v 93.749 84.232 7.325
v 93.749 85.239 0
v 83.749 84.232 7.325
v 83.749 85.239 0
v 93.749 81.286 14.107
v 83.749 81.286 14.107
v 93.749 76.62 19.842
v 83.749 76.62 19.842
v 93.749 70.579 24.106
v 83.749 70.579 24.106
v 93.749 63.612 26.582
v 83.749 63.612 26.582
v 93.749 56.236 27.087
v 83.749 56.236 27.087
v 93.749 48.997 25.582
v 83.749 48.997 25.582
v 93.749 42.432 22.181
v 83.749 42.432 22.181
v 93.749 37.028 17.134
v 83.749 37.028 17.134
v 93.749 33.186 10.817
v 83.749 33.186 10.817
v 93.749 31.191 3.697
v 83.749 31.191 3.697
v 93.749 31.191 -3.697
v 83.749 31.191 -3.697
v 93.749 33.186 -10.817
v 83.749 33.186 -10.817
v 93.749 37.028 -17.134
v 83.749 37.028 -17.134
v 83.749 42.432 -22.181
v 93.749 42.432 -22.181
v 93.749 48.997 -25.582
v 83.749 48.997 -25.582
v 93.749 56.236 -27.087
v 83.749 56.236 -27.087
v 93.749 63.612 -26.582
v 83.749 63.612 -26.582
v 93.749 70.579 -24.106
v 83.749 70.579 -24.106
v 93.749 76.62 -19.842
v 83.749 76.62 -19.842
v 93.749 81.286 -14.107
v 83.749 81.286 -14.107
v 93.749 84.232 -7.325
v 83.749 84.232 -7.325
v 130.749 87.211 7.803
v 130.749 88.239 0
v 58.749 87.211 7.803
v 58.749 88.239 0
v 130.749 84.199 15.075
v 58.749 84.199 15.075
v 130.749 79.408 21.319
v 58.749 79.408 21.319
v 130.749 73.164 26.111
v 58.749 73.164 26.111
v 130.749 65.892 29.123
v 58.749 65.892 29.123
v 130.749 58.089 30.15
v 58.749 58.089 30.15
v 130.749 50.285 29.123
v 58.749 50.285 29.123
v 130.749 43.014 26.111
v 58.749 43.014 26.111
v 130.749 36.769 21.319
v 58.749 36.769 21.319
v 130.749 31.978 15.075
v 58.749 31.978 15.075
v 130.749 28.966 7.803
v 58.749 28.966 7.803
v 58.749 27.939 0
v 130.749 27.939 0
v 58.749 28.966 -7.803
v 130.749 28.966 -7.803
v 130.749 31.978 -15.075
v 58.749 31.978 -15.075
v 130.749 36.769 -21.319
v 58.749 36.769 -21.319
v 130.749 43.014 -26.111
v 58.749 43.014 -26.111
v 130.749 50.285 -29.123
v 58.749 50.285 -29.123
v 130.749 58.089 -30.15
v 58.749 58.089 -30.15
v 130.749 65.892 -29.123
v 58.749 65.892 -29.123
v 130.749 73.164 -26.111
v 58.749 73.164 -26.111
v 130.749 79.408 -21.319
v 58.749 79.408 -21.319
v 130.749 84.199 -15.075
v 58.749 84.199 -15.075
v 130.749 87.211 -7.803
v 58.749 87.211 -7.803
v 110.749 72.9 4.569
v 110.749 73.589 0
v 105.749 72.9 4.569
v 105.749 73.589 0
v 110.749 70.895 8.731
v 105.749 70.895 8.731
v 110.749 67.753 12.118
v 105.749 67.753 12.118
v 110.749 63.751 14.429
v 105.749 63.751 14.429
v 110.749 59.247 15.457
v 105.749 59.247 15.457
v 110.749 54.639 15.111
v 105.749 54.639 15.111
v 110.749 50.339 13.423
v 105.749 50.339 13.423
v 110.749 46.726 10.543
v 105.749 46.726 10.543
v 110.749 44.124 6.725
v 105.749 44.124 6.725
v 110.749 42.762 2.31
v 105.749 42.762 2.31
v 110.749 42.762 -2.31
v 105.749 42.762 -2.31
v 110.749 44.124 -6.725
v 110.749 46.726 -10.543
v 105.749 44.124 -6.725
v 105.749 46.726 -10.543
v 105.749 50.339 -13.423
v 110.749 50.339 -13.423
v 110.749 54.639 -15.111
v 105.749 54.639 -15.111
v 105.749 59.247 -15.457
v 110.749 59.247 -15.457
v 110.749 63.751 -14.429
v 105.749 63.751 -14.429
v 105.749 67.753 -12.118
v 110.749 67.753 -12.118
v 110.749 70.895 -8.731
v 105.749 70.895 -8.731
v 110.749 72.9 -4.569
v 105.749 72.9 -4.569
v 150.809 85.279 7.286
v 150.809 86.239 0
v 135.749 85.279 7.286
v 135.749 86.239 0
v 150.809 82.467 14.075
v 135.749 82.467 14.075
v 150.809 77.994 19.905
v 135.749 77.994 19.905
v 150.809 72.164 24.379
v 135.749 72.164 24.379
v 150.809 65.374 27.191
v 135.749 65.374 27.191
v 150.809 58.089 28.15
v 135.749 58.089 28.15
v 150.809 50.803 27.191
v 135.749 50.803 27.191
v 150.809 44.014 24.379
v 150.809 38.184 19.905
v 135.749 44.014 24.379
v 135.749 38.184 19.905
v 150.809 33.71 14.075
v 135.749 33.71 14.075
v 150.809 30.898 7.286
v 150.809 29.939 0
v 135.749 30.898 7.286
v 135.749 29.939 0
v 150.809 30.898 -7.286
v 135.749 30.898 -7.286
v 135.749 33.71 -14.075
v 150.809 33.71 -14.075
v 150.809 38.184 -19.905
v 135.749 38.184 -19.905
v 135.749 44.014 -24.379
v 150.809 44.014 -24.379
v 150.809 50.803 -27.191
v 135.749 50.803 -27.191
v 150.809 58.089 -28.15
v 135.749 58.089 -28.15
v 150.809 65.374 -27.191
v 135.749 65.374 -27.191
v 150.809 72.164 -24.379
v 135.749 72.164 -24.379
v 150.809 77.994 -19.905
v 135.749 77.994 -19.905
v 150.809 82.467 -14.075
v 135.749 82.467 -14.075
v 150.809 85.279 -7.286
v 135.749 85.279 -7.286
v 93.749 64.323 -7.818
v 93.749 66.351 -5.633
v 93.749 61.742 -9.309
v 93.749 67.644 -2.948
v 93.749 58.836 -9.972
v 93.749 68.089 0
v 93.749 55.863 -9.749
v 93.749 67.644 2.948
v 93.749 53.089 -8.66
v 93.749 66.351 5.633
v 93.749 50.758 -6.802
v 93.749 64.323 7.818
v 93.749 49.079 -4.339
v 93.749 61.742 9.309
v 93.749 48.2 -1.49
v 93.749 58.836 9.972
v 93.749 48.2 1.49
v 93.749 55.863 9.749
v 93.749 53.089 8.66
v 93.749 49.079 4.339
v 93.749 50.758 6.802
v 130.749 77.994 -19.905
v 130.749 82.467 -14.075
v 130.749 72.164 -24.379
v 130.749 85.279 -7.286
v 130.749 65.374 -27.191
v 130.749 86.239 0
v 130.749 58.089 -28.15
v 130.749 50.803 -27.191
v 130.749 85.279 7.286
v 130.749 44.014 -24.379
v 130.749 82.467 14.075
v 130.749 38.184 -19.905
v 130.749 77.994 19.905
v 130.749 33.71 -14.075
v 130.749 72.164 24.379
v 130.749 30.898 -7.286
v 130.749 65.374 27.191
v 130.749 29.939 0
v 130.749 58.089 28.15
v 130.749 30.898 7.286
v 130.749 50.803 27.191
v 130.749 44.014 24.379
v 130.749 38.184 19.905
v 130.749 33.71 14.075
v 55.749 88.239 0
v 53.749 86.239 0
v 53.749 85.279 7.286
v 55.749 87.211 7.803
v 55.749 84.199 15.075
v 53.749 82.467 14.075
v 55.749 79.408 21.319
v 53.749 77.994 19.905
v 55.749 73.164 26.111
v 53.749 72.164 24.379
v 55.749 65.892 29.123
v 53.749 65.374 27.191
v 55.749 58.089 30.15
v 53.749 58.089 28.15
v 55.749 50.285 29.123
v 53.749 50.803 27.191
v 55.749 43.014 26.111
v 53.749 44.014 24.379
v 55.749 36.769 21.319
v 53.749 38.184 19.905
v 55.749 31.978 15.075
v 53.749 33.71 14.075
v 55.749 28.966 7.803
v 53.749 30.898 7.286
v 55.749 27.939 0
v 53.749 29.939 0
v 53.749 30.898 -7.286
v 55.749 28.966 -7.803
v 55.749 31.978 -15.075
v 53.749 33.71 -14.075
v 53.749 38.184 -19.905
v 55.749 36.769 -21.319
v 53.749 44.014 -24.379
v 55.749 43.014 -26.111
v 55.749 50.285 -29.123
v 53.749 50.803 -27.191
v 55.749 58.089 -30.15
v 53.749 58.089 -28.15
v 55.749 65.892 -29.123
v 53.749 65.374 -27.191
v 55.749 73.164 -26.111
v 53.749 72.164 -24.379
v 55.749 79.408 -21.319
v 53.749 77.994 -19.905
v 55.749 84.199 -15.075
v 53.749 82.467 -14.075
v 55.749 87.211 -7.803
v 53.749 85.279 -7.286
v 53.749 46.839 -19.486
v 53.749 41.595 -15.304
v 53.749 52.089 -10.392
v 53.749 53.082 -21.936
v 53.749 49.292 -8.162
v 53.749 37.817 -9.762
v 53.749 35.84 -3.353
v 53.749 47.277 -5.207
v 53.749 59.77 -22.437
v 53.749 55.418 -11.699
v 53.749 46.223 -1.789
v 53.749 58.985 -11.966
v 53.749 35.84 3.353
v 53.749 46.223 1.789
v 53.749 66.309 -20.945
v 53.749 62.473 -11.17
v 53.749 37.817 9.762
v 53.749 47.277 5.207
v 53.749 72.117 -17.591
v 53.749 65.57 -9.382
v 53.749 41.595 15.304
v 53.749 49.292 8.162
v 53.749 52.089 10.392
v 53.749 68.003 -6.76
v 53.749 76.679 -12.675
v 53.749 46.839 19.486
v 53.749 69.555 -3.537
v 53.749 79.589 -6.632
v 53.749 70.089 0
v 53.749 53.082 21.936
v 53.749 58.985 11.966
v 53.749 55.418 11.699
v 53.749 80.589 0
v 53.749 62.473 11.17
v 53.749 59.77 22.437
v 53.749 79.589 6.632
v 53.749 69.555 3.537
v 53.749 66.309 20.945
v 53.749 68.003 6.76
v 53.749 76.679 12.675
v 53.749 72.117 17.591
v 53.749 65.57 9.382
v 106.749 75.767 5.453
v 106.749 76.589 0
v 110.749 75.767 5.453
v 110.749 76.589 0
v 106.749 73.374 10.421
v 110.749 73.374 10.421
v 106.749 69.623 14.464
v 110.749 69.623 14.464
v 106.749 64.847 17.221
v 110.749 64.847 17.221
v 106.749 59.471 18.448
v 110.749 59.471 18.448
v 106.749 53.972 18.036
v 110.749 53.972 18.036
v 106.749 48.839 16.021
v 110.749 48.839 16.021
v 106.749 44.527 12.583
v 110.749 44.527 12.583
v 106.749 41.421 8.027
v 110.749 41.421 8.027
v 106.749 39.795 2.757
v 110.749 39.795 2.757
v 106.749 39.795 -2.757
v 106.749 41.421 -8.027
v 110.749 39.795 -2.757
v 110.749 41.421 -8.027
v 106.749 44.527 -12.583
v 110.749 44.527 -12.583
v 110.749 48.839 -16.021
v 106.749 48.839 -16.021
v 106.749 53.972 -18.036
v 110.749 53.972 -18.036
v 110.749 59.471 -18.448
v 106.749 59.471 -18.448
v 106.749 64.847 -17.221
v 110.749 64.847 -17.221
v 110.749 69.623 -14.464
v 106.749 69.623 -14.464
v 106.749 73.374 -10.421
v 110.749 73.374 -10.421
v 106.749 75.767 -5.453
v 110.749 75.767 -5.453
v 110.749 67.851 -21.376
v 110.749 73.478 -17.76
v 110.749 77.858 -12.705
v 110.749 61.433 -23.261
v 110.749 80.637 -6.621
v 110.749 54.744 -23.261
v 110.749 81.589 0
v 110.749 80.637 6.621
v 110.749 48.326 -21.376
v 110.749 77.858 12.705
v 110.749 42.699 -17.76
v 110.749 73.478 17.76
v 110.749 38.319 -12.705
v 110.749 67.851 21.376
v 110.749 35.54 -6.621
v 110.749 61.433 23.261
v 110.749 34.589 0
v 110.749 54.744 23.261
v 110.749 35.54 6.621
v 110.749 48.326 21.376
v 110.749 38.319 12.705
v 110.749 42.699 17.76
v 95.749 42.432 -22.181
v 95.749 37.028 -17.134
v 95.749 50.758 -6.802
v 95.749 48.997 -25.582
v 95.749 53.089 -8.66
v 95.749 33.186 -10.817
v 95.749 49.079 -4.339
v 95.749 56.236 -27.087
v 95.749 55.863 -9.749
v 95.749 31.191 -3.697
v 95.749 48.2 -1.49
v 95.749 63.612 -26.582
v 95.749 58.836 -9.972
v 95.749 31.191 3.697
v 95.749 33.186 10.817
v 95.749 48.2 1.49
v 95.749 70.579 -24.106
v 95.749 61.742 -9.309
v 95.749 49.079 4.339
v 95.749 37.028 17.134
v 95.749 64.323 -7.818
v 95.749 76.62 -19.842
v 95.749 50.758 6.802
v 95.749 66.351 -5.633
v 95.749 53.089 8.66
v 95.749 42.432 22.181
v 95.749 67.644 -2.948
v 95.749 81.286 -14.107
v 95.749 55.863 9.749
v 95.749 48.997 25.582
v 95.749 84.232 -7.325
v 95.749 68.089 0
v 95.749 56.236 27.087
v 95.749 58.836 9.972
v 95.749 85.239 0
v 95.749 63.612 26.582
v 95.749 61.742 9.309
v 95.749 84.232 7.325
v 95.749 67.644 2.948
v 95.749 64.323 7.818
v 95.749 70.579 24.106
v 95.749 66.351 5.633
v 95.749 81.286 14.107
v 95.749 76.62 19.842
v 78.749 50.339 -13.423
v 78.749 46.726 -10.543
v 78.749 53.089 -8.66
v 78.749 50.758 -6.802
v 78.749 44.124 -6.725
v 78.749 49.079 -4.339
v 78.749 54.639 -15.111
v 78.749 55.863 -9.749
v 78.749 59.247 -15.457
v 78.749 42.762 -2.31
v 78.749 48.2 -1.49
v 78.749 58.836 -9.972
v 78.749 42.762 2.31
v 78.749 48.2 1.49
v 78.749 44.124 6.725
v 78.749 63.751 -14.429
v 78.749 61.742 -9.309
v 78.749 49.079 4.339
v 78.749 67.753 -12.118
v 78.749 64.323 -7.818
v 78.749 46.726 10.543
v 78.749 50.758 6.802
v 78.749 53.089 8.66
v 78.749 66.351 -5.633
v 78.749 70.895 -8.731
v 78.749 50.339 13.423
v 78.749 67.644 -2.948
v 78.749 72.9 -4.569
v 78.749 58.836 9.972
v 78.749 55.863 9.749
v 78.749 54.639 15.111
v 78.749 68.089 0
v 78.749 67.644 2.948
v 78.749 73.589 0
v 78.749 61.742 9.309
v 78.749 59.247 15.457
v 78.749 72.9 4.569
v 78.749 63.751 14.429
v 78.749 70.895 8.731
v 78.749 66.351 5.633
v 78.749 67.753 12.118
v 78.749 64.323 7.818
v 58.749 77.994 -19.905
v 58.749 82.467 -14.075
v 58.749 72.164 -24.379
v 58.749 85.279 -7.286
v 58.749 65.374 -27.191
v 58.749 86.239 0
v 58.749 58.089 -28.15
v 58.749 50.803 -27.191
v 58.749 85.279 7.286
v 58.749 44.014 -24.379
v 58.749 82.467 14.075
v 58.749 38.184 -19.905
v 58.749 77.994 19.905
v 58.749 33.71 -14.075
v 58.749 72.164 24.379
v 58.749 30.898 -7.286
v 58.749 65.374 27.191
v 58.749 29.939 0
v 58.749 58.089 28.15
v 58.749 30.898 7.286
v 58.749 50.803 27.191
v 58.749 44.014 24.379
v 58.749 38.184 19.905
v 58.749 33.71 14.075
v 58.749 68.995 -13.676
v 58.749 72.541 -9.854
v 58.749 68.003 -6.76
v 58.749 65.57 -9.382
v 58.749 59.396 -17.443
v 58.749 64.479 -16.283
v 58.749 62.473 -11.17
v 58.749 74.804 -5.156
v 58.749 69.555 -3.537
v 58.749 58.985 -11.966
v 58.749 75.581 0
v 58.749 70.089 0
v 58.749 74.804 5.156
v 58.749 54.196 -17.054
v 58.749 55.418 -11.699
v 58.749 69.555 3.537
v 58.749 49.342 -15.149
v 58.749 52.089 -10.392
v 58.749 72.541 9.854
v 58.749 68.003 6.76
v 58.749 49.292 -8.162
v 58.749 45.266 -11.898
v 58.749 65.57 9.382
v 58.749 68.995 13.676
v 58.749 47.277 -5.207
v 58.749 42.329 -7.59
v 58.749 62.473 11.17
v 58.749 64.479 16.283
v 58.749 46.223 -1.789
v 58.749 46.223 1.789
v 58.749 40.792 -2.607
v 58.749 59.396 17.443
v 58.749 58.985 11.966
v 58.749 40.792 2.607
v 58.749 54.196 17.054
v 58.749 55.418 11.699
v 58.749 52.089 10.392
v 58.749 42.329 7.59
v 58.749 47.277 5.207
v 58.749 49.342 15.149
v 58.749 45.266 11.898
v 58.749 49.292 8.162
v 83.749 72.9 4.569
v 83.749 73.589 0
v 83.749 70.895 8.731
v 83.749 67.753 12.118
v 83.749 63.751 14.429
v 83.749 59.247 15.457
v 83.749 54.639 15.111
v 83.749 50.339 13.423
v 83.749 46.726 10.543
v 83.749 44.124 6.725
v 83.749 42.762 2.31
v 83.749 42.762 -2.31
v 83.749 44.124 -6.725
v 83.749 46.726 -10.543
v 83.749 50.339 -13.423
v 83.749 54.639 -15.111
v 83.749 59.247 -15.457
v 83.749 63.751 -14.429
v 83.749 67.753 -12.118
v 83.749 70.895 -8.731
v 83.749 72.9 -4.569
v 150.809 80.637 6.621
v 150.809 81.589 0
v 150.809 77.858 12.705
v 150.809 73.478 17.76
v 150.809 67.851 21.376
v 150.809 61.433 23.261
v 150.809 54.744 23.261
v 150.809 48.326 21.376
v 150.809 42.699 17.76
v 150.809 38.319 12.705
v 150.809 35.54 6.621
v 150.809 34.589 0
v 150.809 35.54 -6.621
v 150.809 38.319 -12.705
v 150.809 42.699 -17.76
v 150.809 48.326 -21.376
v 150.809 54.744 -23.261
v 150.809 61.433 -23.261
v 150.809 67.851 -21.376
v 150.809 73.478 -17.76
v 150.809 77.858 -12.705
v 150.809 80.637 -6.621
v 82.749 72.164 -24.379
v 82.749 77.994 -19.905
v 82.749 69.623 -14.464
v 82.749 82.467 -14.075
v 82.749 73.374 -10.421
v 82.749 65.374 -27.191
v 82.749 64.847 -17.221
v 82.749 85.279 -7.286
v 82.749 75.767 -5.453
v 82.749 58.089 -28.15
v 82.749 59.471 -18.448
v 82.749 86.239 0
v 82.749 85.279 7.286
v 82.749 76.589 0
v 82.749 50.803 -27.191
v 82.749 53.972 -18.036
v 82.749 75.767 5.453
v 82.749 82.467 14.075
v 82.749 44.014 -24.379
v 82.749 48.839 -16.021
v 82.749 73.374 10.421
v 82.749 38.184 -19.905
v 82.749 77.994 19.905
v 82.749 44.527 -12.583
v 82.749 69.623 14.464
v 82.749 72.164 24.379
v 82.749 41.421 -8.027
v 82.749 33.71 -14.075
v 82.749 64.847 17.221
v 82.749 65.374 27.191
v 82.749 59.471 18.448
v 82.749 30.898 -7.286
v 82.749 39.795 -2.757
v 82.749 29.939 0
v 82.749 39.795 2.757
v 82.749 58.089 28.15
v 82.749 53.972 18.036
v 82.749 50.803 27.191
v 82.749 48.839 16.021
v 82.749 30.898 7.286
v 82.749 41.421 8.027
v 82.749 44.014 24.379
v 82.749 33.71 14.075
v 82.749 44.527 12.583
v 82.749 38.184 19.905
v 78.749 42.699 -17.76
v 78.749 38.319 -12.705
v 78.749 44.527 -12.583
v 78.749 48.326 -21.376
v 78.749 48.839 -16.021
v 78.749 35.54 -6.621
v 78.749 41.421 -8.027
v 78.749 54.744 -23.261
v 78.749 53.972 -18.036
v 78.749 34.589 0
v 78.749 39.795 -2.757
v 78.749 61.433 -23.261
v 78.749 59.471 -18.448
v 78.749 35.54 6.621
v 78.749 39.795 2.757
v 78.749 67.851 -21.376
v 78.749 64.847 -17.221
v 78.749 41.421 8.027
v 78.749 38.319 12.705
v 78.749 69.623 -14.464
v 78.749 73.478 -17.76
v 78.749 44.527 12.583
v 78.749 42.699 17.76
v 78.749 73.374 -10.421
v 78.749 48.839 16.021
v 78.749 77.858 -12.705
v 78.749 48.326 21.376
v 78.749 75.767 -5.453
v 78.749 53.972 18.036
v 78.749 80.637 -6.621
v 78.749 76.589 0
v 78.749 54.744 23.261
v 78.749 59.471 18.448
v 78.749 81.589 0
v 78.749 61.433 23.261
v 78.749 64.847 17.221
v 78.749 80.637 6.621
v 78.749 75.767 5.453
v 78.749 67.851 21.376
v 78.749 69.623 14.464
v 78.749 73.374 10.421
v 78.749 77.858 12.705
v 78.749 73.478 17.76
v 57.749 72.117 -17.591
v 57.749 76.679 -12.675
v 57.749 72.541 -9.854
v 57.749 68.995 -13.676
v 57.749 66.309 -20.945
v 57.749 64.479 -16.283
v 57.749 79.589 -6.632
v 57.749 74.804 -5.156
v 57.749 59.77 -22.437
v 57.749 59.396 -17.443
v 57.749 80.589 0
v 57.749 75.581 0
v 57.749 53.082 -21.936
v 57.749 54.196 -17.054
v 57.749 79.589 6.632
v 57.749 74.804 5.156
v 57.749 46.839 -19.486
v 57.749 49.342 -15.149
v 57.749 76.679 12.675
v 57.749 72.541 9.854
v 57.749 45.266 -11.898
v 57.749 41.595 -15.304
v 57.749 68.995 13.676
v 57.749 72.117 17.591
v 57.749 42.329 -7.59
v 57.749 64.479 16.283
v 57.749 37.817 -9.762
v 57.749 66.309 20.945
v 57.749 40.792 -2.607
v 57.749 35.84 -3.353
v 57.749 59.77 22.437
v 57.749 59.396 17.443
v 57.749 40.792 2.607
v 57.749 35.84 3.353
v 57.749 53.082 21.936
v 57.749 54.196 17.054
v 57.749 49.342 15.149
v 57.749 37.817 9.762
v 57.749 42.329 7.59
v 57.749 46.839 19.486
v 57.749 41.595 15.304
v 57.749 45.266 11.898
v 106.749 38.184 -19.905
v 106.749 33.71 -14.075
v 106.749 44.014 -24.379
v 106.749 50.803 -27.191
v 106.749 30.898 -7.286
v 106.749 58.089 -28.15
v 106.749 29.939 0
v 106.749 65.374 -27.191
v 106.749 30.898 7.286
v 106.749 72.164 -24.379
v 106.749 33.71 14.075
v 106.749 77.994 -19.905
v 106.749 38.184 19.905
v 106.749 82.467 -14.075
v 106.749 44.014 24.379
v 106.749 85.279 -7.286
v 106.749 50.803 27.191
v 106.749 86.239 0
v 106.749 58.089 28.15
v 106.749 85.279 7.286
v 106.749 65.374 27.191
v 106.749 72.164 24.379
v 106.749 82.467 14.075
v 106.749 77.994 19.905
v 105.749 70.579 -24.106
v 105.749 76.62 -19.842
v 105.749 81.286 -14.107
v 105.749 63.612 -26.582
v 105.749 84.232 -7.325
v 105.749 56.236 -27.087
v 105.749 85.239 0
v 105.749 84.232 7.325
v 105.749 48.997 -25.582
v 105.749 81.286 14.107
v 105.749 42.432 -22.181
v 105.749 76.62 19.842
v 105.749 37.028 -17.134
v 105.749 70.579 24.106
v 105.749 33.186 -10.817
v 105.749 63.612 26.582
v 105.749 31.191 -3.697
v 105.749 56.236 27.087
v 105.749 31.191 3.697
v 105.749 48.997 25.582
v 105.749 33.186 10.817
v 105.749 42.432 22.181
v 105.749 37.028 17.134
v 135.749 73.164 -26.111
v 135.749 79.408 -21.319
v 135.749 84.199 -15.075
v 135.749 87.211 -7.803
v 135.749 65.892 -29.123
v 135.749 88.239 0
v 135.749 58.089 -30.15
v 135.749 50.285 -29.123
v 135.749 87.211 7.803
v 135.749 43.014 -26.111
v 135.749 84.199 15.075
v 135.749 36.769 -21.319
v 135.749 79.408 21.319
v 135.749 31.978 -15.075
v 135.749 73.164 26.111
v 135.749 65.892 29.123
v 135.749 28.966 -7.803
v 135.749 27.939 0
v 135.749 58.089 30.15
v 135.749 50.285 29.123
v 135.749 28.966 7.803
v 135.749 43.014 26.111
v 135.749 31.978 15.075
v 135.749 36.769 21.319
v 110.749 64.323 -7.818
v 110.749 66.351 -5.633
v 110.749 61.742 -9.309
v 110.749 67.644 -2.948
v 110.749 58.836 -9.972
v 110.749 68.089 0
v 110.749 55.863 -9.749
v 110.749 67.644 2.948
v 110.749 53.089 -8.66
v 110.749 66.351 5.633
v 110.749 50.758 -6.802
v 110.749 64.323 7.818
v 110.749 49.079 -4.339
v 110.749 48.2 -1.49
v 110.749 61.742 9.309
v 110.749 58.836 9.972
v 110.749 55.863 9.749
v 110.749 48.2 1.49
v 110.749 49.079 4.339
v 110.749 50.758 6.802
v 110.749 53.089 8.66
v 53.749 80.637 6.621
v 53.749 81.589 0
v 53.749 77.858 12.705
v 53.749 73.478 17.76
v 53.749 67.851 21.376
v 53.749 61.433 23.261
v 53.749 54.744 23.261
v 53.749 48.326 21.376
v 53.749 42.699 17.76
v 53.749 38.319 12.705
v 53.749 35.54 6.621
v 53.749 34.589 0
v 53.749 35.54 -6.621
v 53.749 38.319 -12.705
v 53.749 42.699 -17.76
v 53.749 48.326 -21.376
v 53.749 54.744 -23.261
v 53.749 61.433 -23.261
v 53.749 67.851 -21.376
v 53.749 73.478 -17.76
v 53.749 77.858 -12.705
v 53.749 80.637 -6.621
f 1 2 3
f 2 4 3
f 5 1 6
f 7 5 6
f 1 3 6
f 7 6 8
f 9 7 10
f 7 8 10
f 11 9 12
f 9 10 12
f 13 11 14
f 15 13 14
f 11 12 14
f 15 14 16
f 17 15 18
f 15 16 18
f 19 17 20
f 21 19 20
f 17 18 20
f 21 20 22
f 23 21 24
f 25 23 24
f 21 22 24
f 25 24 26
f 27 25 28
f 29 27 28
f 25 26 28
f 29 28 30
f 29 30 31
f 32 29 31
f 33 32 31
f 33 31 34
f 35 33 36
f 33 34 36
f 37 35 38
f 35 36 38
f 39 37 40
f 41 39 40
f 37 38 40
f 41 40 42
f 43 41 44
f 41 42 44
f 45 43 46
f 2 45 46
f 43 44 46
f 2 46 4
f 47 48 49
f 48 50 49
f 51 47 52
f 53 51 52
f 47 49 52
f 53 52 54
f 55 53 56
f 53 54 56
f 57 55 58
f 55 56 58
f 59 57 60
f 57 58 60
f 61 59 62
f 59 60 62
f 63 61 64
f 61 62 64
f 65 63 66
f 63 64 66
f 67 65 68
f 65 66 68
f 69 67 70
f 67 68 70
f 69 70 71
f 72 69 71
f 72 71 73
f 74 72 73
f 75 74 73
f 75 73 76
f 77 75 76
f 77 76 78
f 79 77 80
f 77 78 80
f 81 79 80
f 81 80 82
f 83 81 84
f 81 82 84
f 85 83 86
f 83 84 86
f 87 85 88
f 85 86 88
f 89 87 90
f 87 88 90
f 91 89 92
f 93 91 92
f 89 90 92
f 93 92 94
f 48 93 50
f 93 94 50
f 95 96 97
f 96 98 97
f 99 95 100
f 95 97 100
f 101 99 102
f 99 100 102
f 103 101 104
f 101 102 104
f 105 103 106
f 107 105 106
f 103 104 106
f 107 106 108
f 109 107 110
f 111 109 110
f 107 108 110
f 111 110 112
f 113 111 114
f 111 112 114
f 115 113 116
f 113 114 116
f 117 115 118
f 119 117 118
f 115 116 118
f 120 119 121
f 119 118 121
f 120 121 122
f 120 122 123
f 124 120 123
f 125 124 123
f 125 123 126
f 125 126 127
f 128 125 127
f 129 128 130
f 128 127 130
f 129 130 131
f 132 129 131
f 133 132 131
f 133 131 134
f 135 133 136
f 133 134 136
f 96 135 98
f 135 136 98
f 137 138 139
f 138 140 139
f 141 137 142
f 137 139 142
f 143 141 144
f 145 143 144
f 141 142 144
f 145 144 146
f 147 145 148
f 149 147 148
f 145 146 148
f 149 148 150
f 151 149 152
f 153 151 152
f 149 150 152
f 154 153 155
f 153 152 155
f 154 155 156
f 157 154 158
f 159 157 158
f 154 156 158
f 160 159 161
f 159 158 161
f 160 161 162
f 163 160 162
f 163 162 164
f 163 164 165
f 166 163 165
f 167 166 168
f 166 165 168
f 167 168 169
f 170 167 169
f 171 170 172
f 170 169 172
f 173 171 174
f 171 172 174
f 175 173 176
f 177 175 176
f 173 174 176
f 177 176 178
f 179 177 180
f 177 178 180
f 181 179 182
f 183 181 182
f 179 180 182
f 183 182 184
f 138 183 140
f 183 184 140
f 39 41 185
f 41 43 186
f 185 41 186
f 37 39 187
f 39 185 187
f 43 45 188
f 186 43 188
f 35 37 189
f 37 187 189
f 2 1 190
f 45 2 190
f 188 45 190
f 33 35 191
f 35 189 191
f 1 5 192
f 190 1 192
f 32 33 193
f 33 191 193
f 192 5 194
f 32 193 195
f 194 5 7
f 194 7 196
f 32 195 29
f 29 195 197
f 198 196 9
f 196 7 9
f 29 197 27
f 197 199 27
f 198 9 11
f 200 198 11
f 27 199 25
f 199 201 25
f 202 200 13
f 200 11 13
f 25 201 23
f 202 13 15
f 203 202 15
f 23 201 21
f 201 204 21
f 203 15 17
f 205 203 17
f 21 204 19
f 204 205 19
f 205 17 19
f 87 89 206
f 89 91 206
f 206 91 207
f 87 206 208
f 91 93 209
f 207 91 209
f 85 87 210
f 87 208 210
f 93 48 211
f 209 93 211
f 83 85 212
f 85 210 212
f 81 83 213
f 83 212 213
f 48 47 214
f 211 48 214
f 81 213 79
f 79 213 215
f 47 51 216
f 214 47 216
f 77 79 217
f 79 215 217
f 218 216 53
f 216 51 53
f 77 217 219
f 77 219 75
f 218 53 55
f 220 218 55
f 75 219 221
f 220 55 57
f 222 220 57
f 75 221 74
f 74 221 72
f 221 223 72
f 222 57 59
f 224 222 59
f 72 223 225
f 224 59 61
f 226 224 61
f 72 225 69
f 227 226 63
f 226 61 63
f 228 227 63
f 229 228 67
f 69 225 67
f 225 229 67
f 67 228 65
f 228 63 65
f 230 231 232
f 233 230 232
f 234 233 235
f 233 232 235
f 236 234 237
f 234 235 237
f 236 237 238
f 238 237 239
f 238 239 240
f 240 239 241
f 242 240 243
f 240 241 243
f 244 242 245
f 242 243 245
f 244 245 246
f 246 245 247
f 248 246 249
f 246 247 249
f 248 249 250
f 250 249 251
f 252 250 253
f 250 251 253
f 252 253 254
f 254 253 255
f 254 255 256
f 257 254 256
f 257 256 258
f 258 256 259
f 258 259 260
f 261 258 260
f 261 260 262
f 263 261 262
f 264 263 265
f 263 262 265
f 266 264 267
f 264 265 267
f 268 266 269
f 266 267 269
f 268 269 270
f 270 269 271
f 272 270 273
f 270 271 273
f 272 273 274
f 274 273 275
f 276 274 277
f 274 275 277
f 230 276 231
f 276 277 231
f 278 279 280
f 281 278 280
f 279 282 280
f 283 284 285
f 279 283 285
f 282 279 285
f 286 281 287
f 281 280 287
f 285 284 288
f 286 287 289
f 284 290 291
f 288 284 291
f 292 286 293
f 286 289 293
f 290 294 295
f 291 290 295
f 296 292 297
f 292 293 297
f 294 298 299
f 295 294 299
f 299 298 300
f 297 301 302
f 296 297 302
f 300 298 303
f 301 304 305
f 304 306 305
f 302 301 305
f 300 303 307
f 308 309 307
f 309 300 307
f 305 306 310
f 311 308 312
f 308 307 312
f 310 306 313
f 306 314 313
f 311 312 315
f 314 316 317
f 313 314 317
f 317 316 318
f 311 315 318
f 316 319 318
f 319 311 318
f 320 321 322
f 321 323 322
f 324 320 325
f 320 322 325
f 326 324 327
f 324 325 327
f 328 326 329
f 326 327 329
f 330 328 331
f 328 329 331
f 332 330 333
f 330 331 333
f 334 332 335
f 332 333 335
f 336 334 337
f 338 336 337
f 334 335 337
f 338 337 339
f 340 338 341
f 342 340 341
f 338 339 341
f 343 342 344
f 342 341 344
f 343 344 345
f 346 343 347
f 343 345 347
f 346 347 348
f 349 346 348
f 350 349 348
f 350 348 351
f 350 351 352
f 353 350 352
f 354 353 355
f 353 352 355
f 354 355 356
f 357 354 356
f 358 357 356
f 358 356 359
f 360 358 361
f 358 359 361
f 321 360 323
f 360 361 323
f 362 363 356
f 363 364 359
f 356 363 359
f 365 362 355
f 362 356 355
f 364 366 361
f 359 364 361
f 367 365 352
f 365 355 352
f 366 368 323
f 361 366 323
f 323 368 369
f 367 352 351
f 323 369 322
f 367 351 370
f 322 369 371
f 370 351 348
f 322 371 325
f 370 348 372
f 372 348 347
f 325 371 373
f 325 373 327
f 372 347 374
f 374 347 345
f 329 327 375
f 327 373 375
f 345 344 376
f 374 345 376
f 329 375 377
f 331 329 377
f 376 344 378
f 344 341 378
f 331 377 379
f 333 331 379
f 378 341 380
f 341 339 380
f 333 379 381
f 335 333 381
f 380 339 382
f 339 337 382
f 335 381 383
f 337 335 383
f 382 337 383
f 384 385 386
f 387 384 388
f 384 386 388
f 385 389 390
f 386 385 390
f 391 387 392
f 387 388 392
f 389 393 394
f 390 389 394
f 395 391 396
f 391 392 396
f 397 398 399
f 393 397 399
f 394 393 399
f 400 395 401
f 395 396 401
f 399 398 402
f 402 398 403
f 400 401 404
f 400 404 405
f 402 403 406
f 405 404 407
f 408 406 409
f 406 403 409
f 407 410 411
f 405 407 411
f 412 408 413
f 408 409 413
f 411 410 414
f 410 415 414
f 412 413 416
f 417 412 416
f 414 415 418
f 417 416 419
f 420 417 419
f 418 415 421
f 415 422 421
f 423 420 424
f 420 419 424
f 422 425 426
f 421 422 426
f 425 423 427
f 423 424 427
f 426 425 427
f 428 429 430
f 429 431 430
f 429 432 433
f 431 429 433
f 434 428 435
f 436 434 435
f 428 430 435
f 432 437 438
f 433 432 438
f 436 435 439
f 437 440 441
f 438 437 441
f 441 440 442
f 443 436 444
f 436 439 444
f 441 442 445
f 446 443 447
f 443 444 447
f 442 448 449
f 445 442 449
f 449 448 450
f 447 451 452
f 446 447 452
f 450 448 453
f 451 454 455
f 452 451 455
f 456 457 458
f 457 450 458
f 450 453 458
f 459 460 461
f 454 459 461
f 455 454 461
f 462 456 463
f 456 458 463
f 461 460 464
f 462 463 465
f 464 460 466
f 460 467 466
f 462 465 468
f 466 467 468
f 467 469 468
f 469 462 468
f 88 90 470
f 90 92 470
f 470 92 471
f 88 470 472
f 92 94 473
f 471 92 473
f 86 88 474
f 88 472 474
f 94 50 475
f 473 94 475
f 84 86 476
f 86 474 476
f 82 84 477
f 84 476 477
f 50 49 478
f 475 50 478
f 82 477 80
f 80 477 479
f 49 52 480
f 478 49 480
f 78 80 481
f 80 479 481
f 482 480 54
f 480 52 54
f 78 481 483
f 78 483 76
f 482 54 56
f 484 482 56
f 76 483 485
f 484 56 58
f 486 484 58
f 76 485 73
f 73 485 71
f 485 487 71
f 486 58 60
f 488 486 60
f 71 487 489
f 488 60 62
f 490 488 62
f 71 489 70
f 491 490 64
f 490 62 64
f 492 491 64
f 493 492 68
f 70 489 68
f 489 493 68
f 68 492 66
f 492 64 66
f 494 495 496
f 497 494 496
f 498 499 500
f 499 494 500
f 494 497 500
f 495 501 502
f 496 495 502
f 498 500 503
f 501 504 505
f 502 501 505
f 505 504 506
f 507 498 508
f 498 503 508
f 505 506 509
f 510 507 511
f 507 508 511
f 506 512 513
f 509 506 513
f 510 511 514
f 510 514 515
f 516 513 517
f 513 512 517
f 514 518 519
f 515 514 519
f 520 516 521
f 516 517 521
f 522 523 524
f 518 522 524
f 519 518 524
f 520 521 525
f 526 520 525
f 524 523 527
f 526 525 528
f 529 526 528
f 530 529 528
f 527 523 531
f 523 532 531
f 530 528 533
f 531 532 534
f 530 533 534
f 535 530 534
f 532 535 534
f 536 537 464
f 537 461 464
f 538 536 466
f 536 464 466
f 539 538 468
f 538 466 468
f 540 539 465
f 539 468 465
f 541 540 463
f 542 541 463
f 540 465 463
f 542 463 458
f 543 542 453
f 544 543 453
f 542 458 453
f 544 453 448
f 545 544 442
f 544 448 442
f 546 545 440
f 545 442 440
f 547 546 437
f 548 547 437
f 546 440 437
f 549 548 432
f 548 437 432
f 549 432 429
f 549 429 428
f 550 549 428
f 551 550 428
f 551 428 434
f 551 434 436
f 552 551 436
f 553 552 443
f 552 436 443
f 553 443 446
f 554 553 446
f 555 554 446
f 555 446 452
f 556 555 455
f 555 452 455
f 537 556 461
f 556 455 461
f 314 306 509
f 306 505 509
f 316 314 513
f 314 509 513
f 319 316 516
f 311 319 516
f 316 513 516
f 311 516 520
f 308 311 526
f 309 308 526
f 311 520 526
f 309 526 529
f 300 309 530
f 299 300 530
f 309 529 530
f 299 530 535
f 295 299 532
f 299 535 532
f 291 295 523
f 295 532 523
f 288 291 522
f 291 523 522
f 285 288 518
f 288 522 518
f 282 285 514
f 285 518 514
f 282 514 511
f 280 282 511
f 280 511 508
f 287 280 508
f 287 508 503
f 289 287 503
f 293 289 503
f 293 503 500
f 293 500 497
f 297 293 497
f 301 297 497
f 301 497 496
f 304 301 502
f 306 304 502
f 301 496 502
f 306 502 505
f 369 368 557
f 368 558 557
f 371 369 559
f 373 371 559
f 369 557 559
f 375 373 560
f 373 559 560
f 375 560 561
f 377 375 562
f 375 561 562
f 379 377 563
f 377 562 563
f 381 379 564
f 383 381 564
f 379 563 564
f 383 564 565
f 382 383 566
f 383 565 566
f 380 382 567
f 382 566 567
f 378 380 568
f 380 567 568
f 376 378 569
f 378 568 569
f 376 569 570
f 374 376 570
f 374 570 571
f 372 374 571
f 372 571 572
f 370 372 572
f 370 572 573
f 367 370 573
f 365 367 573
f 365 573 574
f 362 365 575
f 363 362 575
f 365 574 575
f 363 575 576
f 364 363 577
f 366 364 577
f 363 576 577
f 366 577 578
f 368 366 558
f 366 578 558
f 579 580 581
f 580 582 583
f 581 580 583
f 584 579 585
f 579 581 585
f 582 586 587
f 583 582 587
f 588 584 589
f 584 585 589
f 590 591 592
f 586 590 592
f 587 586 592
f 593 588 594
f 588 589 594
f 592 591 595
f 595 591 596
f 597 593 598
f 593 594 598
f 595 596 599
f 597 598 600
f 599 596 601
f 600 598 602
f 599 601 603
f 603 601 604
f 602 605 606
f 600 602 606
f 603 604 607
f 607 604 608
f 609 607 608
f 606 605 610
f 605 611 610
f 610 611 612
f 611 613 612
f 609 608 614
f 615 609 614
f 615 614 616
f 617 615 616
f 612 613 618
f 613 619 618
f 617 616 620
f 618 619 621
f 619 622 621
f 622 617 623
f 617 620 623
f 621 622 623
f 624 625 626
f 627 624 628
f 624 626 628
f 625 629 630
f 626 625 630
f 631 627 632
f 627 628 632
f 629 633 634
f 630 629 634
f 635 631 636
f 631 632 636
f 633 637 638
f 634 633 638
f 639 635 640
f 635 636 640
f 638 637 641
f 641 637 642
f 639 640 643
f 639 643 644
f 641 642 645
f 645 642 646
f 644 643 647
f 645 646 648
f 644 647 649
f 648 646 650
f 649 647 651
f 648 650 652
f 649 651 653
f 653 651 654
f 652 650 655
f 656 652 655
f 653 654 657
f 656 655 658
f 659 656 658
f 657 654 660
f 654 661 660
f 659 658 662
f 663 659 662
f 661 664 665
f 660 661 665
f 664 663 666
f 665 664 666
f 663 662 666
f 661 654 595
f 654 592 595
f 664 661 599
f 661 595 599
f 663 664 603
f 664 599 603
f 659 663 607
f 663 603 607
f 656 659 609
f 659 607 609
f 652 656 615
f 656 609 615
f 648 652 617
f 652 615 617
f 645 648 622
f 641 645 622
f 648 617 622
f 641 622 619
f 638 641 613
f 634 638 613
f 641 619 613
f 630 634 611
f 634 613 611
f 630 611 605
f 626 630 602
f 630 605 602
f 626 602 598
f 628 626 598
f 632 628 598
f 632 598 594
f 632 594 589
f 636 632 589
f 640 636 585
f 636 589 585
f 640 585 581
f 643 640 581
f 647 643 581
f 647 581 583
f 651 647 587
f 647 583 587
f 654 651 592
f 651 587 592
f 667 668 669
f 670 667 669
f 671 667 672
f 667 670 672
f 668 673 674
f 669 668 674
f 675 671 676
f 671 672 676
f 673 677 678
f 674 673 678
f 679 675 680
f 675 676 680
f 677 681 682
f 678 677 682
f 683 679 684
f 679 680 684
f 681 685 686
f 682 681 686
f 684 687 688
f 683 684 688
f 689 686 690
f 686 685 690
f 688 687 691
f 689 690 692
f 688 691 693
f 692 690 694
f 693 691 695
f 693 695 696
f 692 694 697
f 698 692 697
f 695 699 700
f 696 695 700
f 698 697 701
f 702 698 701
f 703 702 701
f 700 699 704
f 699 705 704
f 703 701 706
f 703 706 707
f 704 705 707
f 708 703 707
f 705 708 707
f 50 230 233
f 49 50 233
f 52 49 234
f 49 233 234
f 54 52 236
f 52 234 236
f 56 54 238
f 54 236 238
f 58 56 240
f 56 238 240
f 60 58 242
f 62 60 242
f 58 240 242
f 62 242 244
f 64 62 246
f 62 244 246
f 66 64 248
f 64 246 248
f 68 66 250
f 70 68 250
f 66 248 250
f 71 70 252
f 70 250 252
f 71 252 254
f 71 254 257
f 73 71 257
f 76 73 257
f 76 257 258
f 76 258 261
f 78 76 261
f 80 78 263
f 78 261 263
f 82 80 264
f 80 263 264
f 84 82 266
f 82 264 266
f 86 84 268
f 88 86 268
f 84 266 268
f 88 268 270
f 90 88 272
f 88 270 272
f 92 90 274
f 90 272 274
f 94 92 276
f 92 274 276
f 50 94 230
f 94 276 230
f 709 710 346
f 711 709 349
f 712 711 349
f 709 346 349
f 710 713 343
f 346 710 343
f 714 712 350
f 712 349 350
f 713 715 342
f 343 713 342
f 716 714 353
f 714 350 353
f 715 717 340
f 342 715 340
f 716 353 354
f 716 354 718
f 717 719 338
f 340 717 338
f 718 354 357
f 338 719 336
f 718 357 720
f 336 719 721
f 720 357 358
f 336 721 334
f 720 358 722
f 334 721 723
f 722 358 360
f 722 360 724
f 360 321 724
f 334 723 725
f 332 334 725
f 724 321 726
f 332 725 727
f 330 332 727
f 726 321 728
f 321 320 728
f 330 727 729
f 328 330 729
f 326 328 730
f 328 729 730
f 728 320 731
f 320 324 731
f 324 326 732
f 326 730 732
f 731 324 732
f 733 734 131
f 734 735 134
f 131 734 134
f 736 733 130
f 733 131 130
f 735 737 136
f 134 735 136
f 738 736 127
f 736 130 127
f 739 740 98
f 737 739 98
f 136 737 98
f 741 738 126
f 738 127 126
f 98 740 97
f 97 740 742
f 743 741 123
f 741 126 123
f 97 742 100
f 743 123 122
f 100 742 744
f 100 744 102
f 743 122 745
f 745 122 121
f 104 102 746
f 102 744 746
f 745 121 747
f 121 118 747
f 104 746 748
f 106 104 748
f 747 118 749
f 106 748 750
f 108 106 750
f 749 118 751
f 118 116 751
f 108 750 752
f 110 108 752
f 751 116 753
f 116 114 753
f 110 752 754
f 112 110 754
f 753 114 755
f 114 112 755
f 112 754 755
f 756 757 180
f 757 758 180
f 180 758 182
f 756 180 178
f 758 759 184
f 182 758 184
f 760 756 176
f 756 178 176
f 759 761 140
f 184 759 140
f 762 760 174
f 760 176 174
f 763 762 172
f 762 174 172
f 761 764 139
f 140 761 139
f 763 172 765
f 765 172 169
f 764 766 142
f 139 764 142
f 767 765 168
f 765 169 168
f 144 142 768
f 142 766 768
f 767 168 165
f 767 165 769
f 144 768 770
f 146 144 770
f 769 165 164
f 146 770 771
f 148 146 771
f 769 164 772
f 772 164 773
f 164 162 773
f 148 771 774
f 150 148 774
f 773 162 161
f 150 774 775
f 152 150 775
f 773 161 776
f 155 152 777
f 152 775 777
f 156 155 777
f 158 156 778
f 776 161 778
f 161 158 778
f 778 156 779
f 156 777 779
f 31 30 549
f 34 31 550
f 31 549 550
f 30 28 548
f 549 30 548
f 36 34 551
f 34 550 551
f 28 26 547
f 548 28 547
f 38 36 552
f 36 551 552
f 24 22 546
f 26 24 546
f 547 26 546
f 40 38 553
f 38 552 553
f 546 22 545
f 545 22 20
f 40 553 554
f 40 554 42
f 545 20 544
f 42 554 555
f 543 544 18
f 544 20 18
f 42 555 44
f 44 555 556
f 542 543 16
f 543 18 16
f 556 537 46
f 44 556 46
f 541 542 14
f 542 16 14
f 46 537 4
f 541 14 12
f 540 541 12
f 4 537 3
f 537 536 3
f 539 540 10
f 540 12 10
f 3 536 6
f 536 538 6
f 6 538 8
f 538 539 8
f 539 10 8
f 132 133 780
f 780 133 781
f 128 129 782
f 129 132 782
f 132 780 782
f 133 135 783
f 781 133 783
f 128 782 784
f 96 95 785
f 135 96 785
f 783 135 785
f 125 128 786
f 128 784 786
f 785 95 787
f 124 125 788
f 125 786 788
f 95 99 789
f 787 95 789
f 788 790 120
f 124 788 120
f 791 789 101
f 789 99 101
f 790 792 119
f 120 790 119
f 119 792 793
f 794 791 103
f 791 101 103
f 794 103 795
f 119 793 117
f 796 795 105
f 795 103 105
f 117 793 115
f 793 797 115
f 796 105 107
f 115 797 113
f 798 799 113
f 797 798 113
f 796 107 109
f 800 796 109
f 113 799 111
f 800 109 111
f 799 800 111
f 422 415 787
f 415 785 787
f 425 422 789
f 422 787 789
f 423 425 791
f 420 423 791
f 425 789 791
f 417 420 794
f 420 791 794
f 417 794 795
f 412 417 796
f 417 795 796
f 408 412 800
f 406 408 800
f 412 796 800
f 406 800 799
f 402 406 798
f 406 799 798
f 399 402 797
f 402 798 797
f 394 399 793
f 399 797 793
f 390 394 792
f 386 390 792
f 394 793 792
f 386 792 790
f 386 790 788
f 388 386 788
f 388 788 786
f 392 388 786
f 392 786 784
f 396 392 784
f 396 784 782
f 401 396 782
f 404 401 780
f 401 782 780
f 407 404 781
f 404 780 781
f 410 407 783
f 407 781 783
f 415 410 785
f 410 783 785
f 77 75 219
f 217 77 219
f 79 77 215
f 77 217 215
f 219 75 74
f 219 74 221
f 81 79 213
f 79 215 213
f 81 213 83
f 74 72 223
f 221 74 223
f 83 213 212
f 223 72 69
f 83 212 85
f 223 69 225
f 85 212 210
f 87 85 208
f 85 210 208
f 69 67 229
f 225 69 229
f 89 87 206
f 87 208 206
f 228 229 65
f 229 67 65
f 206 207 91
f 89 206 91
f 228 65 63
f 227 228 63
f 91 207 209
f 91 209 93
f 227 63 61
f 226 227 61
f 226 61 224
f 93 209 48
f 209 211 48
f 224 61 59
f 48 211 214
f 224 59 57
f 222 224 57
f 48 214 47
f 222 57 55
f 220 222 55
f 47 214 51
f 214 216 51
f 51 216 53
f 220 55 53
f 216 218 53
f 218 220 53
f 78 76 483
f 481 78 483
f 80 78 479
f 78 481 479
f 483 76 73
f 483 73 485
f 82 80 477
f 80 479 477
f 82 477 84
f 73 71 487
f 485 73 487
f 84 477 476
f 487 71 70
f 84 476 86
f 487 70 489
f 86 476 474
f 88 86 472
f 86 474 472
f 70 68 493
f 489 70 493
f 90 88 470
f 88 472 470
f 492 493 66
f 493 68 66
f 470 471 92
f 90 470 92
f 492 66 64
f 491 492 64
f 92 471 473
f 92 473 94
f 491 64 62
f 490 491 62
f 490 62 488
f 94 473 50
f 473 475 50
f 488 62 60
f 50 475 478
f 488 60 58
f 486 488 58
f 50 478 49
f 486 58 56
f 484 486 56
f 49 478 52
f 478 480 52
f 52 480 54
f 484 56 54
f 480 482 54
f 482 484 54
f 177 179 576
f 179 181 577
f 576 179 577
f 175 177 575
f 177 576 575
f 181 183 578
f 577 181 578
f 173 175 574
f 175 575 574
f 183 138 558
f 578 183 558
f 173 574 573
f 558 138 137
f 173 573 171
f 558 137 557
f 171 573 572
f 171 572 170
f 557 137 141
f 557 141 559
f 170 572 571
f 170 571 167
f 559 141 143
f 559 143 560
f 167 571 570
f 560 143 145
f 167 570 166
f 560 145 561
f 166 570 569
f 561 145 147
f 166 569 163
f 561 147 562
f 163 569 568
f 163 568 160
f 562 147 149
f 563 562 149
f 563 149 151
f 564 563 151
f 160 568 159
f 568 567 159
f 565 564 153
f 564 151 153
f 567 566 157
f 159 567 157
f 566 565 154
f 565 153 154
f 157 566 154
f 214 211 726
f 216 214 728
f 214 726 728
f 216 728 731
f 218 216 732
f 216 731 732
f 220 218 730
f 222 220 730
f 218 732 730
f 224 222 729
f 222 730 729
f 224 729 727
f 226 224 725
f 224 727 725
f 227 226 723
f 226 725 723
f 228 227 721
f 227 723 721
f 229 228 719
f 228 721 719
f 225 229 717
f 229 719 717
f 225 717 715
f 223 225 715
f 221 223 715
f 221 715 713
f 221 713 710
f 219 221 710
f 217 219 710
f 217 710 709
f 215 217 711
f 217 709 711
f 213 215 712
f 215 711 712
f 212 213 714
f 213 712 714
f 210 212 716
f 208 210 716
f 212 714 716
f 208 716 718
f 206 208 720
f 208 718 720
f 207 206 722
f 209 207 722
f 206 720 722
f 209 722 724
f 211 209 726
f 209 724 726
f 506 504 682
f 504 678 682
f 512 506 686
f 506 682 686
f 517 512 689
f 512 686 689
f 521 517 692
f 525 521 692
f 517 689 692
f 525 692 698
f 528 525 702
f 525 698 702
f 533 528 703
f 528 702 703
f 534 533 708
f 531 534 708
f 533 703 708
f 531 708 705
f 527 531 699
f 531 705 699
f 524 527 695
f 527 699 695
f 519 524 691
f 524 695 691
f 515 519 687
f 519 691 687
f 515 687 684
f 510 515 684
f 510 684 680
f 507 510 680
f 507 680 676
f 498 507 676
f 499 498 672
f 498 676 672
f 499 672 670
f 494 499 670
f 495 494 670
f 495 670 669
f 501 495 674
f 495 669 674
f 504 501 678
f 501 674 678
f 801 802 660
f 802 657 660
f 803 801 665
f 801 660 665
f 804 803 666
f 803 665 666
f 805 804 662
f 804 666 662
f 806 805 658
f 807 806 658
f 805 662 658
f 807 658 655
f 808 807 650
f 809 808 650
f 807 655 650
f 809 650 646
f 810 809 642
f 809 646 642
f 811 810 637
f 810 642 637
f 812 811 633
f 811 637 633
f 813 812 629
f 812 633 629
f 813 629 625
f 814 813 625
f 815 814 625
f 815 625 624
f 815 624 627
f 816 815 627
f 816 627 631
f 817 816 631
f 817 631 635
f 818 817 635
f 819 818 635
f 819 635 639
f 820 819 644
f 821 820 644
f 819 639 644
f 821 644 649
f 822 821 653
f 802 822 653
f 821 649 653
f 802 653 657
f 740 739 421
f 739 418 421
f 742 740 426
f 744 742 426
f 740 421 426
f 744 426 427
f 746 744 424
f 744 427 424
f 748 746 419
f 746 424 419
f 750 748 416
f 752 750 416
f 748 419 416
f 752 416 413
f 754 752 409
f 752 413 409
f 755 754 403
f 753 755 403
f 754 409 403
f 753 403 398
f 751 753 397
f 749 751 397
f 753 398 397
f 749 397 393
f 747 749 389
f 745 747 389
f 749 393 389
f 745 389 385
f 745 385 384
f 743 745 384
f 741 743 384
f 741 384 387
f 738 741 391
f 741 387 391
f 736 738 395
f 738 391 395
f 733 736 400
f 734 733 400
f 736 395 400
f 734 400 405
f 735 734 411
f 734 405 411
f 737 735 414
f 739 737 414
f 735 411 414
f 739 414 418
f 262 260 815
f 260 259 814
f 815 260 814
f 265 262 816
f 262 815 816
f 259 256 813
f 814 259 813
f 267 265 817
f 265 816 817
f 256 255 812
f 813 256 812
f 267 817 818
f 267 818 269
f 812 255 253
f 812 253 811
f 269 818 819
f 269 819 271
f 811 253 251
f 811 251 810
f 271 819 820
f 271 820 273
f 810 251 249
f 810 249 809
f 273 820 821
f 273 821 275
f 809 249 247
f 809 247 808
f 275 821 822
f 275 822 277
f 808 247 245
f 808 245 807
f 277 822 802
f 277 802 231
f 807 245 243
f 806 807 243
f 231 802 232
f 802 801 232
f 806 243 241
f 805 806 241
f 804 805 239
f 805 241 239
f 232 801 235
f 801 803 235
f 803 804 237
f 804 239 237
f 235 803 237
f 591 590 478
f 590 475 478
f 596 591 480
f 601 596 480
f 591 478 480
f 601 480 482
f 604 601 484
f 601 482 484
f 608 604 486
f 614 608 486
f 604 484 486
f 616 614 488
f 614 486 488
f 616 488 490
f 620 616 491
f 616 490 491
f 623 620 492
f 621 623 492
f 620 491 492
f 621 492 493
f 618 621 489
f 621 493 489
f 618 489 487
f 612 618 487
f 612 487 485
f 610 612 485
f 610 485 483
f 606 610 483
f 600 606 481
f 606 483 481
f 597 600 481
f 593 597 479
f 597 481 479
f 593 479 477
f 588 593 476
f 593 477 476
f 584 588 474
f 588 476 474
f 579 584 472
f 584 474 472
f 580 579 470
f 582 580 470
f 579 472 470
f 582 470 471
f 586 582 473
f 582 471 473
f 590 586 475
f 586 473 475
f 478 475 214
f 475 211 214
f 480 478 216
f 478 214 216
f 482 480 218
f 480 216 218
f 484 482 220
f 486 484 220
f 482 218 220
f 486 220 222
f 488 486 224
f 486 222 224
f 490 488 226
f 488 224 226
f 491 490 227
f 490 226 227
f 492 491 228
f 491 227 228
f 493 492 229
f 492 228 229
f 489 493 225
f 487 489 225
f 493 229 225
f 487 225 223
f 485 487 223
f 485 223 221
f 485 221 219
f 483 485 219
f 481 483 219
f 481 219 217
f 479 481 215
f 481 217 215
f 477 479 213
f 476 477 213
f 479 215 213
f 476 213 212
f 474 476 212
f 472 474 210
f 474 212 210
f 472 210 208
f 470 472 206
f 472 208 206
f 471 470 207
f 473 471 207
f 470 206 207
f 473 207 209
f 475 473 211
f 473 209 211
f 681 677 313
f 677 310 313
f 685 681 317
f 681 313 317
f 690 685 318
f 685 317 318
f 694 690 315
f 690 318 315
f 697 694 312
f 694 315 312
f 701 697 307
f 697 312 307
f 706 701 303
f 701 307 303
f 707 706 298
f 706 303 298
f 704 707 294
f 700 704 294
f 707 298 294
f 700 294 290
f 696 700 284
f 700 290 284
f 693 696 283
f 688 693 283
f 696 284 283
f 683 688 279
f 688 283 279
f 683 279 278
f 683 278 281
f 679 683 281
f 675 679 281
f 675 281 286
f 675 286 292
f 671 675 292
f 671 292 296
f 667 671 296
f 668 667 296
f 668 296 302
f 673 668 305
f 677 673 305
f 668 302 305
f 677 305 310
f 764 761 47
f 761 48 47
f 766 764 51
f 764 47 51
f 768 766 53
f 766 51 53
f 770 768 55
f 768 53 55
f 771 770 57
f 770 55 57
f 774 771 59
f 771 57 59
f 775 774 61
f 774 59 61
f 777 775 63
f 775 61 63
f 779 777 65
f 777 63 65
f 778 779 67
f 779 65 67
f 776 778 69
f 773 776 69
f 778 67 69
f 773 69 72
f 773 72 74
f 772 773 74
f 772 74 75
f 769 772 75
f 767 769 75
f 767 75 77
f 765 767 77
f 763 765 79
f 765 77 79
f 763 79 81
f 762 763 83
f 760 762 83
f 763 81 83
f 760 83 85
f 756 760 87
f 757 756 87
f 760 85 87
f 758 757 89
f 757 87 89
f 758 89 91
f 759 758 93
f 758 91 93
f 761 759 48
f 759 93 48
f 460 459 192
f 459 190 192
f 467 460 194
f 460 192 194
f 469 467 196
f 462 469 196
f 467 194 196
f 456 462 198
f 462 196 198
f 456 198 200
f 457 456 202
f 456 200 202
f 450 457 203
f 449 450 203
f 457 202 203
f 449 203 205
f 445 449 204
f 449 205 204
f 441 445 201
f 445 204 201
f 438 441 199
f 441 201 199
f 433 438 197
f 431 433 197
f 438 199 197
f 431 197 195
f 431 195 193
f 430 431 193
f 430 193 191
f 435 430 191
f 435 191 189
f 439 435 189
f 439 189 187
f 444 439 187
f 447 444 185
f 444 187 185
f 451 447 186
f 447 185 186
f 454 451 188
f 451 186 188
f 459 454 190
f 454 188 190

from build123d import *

# Parameters (mm, degrees)
F3_SIZE = 2


with BuildPart() as f1:
    # F0 (on Top) → F1 (revolve)
    with BuildSketch(Plane.XY):
        Polygon((95.7488511355, 85.2385589326), (95.7488511355, 68.0885589326), (110.7488511355, 68.0885589326), (110.7488511355, 73.5885589326), (105.7488511355, 73.5885589326), (105.7488511355, 85.2385589326), align=None)
    revolve(axis=Axis((39.9243277874, 58.0885589326, 0), (1, 0, 0)))


with BuildPart() as f1b:
    # F0 (on Top) → F1, piece 2 (revolve)
    with BuildSketch(Plane.XY):
        Polygon((135.7488511355, 88.2385589326), (130.7488511355, 88.2385589326), (130.7488511355, 86.2385589326), (106.7488511355, 86.2385589326), (106.7488511355, 76.5885589326), (110.7488511355, 76.5885589326), (110.7488511355, 81.5885589326), (135.7488511355, 81.5885589326), (150.8092582226, 81.5885589326), (150.8092582226, 86.2385589326), (135.7488511355, 86.2385589326), align=None)
    revolve(axis=Axis((39.9243277874, 58.0885589326, 0), (1, 0, 0)))


with BuildPart() as f1c:
    # F0 (on Top) → F1, piece 3 (revolve)
    with BuildSketch(Plane.XY):
        Polygon((58.7488511355, 88.2385589326), (53.7488511355, 88.2385589326), (53.7488511355, 81.5885589326), (78.7488511355, 81.5885589326), (78.7488511355, 76.5885589326), (82.7488511355, 76.5885589326), (82.7488511355, 86.2385589326), (58.7488511355, 86.2385589326), align=None)
    revolve(axis=Axis((39.9243277874, 58.0885589326, 0), (1, 0, 0)))

    # F3
    f3_edges = [f1c.edges().sort_by_distance(p)[0] for p in [
        (53.748851, 27.938559, 0),
    ]]
    chamfer(f3_edges, length=F3_SIZE)


with BuildPart() as f1d:
    # F0 (on Top) → F1, piece 4 (revolve)
    with BuildSketch(Plane.XY):
        Polygon((78.7488511355, 73.5885589326), (78.7488511355, 68.0885589326), (93.7488511355, 68.0885589326), (93.7488511355, 85.2385589326), (83.7488511355, 85.2385589326), (83.7488511355, 73.5885589326), align=None)
    revolve(axis=Axis((39.9243277874, 58.0885589326, 0), (1, 0, 0)))


with BuildPart() as f2:
    # F0 (on Top) → F2 (revolve)
    with BuildSketch(Plane.XY):
        Polygon((130.7488511355, 88.2385589326), (58.7488511355, 88.2385589326), (58.7488511355, 86.2385589326), (82.7488511355, 86.2385589326), (106.7488511355, 86.2385589326), (130.7488511355, 86.2385589326), align=None)
    revolve(axis=Axis((39.9243277874, 58.0885589326, 0), (1, 0, 0)))


with BuildPart() as f4:
    # F0 (on Top) → F4 (revolve)
    with BuildSketch(Plane.XY):
        Polygon((53.7488511355, 80.5885589326), (53.7488511355, 70.0885589326), (58.7488511355, 70.0885589326), (58.7488511355, 75.5808874965), (57.7488511355, 75.5808874965), (57.7488511355, 80.5885589326), align=None)
    revolve(axis=Axis((39.9243277874, 58.0885589326, 0), (1, 0, 0)))


solid = Compound([f1.part, f1b.part, f1c.part, f1d.part, f2.part, f4.part])
